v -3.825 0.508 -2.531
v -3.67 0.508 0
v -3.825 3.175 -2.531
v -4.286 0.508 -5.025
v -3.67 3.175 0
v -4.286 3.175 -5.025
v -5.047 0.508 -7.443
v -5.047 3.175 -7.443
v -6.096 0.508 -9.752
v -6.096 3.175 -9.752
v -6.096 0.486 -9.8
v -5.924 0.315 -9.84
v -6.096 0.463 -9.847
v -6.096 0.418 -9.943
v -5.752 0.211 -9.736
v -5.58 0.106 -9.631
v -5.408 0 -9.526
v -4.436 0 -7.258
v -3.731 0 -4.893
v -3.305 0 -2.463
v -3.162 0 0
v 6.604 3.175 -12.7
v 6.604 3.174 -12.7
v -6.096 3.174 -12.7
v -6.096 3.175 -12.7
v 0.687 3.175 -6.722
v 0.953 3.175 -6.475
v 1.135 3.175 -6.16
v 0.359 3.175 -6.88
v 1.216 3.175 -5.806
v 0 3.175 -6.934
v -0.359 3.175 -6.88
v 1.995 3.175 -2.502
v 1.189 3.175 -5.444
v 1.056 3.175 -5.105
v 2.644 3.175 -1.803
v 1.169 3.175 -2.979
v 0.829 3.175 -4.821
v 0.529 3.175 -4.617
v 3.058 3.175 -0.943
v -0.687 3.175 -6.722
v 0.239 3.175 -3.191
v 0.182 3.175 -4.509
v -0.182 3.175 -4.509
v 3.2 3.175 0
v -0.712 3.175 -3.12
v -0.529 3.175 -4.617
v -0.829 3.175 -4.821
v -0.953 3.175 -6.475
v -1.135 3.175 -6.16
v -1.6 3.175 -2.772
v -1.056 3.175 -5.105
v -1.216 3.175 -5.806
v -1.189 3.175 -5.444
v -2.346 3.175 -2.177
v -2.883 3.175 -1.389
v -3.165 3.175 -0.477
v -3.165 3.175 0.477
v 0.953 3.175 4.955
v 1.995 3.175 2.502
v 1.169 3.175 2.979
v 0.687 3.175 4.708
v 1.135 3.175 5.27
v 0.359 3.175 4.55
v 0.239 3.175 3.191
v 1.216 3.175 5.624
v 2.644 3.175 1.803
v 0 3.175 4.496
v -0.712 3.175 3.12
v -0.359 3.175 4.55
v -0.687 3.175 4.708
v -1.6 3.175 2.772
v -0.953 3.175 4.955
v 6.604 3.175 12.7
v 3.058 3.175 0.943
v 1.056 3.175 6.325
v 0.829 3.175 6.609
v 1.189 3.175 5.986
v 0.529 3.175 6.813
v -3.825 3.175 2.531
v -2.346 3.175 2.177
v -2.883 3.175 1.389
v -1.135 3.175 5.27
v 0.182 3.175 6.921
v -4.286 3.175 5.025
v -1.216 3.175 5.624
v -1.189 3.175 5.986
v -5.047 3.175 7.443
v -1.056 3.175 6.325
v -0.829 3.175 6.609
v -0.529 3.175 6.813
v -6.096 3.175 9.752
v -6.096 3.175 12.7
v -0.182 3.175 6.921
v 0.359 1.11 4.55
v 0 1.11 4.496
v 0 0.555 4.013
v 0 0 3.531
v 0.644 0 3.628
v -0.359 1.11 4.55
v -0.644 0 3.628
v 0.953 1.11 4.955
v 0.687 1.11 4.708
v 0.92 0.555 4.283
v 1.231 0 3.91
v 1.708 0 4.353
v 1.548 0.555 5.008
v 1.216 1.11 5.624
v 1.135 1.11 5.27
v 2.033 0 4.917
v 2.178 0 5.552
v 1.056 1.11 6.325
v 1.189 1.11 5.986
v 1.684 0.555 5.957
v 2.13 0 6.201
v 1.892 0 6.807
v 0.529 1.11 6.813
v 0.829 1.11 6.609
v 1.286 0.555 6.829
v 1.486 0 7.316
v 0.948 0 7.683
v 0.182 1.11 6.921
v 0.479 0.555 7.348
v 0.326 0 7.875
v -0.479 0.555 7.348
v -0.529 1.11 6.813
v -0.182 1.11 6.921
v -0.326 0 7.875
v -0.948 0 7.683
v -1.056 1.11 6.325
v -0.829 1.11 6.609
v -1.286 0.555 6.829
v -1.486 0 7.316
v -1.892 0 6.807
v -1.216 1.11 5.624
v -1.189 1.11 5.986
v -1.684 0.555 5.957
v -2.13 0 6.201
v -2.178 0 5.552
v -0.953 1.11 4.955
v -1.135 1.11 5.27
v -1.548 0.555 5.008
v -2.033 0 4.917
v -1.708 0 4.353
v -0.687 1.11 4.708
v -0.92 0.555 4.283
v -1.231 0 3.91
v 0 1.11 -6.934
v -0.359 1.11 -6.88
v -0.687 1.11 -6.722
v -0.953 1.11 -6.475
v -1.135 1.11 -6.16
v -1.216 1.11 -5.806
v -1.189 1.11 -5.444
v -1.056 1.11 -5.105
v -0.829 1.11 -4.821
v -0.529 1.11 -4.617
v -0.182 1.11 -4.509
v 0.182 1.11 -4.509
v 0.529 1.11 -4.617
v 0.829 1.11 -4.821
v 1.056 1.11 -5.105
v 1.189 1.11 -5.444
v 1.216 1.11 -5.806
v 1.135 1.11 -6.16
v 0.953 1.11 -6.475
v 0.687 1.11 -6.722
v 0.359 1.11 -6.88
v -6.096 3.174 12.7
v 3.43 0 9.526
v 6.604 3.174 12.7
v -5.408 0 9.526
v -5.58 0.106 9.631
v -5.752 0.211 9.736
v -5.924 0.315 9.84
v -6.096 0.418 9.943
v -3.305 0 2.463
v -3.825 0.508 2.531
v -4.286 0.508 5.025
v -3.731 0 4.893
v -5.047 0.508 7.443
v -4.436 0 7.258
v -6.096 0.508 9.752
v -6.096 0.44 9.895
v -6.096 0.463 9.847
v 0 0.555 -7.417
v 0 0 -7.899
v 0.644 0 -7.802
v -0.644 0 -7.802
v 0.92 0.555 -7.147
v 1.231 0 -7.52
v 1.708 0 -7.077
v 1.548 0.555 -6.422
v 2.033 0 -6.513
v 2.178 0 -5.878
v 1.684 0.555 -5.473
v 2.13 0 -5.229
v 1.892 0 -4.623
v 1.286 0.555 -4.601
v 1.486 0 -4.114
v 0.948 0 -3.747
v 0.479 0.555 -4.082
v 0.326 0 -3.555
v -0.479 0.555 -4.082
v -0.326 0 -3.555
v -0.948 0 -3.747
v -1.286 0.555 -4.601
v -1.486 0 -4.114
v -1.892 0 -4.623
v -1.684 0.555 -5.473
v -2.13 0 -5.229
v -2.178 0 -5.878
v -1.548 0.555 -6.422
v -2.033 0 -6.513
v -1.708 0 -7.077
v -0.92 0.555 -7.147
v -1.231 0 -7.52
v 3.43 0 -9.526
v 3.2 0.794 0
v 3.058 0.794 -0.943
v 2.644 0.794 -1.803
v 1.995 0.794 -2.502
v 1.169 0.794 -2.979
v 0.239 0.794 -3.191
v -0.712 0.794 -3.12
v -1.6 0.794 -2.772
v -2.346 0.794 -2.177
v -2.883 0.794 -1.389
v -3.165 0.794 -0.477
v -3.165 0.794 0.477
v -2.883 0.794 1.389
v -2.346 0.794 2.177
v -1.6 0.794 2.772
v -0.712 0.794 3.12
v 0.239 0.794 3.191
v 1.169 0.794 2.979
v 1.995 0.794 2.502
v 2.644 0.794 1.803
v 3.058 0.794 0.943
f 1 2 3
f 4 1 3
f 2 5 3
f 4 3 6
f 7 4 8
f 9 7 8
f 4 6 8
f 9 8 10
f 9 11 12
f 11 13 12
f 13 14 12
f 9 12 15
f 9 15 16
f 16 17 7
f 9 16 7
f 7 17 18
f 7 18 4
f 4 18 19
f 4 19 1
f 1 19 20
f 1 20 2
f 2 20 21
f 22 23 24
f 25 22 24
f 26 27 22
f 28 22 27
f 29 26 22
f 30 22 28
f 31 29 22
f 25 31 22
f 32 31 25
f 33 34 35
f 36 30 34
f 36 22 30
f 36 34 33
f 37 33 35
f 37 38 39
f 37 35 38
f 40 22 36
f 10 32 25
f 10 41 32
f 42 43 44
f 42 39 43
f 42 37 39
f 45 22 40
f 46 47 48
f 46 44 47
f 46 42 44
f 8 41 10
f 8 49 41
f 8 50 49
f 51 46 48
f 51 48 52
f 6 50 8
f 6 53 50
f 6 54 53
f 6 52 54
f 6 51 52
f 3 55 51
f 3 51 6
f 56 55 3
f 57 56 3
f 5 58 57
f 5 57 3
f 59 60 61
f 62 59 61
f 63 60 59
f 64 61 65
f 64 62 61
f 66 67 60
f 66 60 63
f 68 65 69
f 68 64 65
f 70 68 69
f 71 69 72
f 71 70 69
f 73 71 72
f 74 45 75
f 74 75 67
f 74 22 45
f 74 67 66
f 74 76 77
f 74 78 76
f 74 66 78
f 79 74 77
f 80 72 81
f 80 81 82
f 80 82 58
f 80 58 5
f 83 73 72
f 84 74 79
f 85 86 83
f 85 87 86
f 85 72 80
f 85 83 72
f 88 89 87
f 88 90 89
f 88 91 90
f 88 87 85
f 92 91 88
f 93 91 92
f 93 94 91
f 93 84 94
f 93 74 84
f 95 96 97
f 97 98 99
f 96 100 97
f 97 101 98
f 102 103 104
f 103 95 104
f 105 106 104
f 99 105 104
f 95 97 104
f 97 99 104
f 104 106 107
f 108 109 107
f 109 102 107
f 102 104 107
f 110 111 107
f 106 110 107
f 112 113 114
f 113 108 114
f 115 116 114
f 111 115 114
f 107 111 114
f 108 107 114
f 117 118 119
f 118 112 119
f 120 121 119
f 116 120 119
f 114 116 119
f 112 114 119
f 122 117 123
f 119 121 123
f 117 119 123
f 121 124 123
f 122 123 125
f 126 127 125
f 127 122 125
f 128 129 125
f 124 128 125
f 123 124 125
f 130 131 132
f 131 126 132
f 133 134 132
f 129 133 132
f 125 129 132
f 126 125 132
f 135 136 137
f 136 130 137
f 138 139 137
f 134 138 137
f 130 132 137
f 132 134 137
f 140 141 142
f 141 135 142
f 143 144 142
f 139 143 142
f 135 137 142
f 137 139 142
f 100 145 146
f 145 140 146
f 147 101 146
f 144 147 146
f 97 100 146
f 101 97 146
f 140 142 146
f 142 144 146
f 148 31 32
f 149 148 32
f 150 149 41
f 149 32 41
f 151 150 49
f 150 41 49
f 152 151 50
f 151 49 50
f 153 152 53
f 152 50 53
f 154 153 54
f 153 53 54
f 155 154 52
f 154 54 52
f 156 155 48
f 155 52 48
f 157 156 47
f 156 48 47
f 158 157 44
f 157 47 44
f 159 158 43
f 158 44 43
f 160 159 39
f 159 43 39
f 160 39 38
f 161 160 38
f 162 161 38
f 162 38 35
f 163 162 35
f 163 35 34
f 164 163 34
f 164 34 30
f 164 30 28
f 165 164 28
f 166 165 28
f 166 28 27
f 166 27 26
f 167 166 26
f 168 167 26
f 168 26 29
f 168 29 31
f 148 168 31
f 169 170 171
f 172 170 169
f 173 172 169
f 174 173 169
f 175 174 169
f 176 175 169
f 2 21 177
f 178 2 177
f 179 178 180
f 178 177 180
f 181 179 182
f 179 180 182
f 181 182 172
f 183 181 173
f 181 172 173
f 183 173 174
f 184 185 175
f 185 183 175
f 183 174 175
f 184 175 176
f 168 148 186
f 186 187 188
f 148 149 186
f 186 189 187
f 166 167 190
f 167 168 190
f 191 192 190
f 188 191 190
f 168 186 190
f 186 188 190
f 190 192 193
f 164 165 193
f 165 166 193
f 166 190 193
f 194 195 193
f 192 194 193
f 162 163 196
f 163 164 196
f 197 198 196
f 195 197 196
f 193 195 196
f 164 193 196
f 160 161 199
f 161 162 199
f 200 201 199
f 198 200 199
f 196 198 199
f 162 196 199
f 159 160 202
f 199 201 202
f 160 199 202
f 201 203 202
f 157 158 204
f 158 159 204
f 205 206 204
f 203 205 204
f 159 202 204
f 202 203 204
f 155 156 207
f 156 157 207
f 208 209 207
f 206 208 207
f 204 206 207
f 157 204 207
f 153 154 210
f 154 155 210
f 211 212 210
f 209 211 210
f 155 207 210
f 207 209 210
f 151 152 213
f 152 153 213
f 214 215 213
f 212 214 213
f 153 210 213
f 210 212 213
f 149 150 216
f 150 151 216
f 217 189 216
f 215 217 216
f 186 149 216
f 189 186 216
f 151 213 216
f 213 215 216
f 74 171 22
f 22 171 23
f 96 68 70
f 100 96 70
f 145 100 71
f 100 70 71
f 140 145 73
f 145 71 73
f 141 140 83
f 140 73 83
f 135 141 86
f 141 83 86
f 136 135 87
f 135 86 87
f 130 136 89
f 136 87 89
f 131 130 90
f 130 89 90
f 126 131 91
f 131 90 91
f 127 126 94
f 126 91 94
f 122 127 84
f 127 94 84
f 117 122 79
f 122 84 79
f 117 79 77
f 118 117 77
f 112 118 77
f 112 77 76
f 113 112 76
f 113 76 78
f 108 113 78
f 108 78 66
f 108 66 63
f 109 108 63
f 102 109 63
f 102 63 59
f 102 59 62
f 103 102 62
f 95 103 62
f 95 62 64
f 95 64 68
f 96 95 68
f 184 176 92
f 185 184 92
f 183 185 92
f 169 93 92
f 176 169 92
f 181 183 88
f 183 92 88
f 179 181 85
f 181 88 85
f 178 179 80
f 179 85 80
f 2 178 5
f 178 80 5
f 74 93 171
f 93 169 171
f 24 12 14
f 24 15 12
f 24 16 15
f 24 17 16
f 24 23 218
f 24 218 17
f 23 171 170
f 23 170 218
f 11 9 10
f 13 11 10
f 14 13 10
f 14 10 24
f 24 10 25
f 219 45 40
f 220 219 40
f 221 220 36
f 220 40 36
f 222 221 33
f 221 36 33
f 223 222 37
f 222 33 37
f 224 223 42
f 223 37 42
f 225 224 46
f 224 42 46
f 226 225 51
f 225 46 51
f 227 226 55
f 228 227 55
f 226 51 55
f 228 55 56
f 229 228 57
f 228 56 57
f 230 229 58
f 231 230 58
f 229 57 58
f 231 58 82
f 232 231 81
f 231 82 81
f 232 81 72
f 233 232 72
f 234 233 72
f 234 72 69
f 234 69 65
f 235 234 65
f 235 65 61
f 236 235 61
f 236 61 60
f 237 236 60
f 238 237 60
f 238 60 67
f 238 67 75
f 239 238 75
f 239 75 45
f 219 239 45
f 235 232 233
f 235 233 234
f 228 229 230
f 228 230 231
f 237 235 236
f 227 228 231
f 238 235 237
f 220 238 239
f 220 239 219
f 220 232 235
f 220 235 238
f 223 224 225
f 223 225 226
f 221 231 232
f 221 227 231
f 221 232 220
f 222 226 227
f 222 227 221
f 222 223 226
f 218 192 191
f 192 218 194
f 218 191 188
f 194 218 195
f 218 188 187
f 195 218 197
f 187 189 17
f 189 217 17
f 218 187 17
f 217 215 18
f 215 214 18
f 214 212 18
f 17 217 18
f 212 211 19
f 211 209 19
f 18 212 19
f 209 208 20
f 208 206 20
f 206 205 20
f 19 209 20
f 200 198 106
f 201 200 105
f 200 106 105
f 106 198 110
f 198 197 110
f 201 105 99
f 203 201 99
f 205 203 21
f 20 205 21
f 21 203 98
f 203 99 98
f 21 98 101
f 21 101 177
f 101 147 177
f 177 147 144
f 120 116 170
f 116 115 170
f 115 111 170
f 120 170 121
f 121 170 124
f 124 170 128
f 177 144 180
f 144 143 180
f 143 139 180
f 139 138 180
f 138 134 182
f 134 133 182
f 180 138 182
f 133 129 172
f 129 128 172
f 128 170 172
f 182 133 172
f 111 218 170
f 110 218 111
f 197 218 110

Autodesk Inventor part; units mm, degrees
ref_plane "YZ Plane" through (0, 0, 0) normal (1, 0, 0) x (0, 1, 0)
ref_plane "XZ Plane" through (0, 0, 0) normal (0, 1, 0) x (-1, 0, 0)
ref_plane "XY Plane" through (0, 0, 0) normal (0, 0, 1) x (1, 0, 0)
sketch "Sketch1" plane through (0, 0, 0) normal (0, 1, 0) x (-1, 0, 0)
  circle A0 centre (0, 0) radius 3.175 construction
  line L0 (3.556, 12.7) -> (-6.604, 12.7)
  line L1 (-6.604, 12.7) -> (-6.604, -12.7)
  line L2 (-6.604, -12.7) -> (3.556, -12.7)
  line L3 (3.556, -12.7) -> (3.556, 12.7)
  line L4 (5.588, 0) -> (-8.636, 0) projected
  dimension "d0" = 6.35
  dimension "d1" = 3.556
  dimension "d2" = 10.16
  dimension "d3" = 25.4
extrude "Extrusion1" add sketch "Sketch1" along normal blind 3.175
sketch "Sketch2" plane through (0, 3.175, 0) normal (0, 1, 0) x (1, 0, 0)
  line L0 (-5.588, 0) -> (8.636, 0) projected
  line L1 (0, 17.78) -> (0, -17.78) projected
  circle A0 centre (0, 0) radius 3.2004
  dimension "d6" = 6.4008
extrude "Extrusion2" cut sketch "Sketch2" against normal blind 2.3813
sketch "Sketch3" plane through (0, 0, 0) normal (0, -1, 0) x (1, 0, 0)
  line L0 (0, -17.78) -> (0, 17.78) projected
  line L1 (-5.588, 0) -> (8.636, 0) projected
  point P0 (0, 0)
  point P1 (0, 5.715)
  point P2 (0, -5.715)
  dimension "d9" = 11.43
hole "Hole1" at (0, 0, 5.715) at (0, 0, -5.715) direction (0, 1, 0) diameter 2.4384 depth 25.4 tip angle 118 countersink diameter 4.3688 countersink angle 82 clearance for "Flat Head Machine Screw (82)" size "#2" standard "Ansi Unified Screw Threads"
chamfer "Chamfer3" distance 3.175 angle 45 1 edges at (6.604, 0, 0)
sketch "Sketch4" plane through (0, 3.175, 0) normal (0, 1, 0) x (1, 0, 0)
  arc A0 (-3.6703, 0) -> (-7.9936, 12.7) centre (-24.4856, 0) ccw
  line L0 (-55.6819, 0) -> (16.985, 0) projected
  line L1 (-3.556, -12.7) -> (6.604, -12.7) projected
  line L2 (6.604, 12.7) -> (-3.556, 12.7) projected
  line L3 (-3.556, 12.7) -> (-3.556, -12.7) projected
  line L4 (-3.556, -12.7) -> (-7.9936, -12.7)
  line L5 (-3.556, 12.7) -> (-7.9936, 12.7)
  line L6 (-3.556, -12.7) -> (-3.556, 12.7)
  arc A1 (-7.9936, -12.7) -> (-3.6703, 0) centre (-24.4856, 0) ccw
  arc A2 (-7.9936, 12.7) -> (-7.9936, -12.7) centre (-24.4856, 0) ccw construction
  point P0 (0, 0)
  dimension "d26" = 24.4856
  dimension "d27" = 41.6306
extrude "Extrusion3" add sketch "Sketch4" against normal blind 3.175
chamfer "Chamfer4" distance 3.175 angle 45 2 edges at (-2.282, 0, 12.7) (-2.282, 0, -12.7)
chamfer "Chamfer5" distance 0.508 angle 45 1 edges at (-3.6703, 0, 0)
sketch "Sketch5" plane through (0, 3.175, 0) normal (0, 1, 0) x (1, 0, 0)
  line L0 (-6.096, -13.97) -> (-6.096, 13.97)
  line L1 (6.604, -12.7) -> (6.604, 12.7) projected
  line L2 (-6.096, -13.97) -> (-12.446, -13.97)
  line L3 (-12.446, -13.97) -> (-12.446, 13.97)
  line L4 (-12.446, 13.97) -> (-6.096, 13.97)
  circle A0 centre (0, 0) radius 3.2004 projected
  line L5 (-16.256, 0) -> (10.414, 0) projected
  dimension "d36" = 12.7
  dimension "d37" = 6.35
  dimension "d38" = 27.94
extrude "Extrusion4" cut sketch "Sketch5" against normal blind 3.175 contours L2 L3 L5 L0 | L5 L3 L4 L0
sketch "Sketch6" plane through (0, 0, 0) normal (0, -1, 0) x (1, 0, 0)
  circle A0 centre (0, 0) radius 3.2004 projected
  line L0 (-5.588, 0) -> (8.636, 0) projected
  line L1 (0, -17.78) -> (0, 17.78) projected
  line L2 (0, 0) -> (2.4318, -2.8981) construction
  line L3 (-3.006, 2.3476) -> (1.79, -3.368)
  line L4 (2.3491, -3.417) -> (2.9571, -2.9067)
  line L5 (3.006, -2.3476) -> (-1.79, 3.368)
  line L6 (-2.3491, 3.417) -> (-2.9571, 2.9067)
  line L7 (-3.2612, 2.6516) -> (3.2612, -2.6516) construction
  line L8 (2.0451, -3.6721) -> (-2.0451, 3.6721) construction
  arc A1 (2.9571, -2.9067) -> (3.006, -2.3476) centre (2.702, -2.6027) ccw
  arc A2 (1.79, -3.368) -> (2.3491, -3.417) centre (2.094, -3.1129) ccw
  arc A3 (-2.9571, 2.9067) -> (-3.006, 2.3476) centre (-2.702, 2.6027) ccw
  arc A4 (-1.79, 3.368) -> (-2.3491, 3.417) centre (-2.094, 3.1129) ccw
  dimension "d41" = 50
  dimension "d42" = 8.255
  dimension "d43" = 1.5875
  dimension "d46" = 0.3969
  dimension "d47" = 140
extrude "Extrusion5" [suppressed]
equation "\"d4\" = bearing_thickness"
equation "\"d28\" = bearing_thickness"
equation "\"d39\" = bearing_thickness"
equation "\"bearing_thickness\" = 3.175"
properties part number "bearing_insert_thick_flat_projecting" material "Stainless Steel, 440C"
